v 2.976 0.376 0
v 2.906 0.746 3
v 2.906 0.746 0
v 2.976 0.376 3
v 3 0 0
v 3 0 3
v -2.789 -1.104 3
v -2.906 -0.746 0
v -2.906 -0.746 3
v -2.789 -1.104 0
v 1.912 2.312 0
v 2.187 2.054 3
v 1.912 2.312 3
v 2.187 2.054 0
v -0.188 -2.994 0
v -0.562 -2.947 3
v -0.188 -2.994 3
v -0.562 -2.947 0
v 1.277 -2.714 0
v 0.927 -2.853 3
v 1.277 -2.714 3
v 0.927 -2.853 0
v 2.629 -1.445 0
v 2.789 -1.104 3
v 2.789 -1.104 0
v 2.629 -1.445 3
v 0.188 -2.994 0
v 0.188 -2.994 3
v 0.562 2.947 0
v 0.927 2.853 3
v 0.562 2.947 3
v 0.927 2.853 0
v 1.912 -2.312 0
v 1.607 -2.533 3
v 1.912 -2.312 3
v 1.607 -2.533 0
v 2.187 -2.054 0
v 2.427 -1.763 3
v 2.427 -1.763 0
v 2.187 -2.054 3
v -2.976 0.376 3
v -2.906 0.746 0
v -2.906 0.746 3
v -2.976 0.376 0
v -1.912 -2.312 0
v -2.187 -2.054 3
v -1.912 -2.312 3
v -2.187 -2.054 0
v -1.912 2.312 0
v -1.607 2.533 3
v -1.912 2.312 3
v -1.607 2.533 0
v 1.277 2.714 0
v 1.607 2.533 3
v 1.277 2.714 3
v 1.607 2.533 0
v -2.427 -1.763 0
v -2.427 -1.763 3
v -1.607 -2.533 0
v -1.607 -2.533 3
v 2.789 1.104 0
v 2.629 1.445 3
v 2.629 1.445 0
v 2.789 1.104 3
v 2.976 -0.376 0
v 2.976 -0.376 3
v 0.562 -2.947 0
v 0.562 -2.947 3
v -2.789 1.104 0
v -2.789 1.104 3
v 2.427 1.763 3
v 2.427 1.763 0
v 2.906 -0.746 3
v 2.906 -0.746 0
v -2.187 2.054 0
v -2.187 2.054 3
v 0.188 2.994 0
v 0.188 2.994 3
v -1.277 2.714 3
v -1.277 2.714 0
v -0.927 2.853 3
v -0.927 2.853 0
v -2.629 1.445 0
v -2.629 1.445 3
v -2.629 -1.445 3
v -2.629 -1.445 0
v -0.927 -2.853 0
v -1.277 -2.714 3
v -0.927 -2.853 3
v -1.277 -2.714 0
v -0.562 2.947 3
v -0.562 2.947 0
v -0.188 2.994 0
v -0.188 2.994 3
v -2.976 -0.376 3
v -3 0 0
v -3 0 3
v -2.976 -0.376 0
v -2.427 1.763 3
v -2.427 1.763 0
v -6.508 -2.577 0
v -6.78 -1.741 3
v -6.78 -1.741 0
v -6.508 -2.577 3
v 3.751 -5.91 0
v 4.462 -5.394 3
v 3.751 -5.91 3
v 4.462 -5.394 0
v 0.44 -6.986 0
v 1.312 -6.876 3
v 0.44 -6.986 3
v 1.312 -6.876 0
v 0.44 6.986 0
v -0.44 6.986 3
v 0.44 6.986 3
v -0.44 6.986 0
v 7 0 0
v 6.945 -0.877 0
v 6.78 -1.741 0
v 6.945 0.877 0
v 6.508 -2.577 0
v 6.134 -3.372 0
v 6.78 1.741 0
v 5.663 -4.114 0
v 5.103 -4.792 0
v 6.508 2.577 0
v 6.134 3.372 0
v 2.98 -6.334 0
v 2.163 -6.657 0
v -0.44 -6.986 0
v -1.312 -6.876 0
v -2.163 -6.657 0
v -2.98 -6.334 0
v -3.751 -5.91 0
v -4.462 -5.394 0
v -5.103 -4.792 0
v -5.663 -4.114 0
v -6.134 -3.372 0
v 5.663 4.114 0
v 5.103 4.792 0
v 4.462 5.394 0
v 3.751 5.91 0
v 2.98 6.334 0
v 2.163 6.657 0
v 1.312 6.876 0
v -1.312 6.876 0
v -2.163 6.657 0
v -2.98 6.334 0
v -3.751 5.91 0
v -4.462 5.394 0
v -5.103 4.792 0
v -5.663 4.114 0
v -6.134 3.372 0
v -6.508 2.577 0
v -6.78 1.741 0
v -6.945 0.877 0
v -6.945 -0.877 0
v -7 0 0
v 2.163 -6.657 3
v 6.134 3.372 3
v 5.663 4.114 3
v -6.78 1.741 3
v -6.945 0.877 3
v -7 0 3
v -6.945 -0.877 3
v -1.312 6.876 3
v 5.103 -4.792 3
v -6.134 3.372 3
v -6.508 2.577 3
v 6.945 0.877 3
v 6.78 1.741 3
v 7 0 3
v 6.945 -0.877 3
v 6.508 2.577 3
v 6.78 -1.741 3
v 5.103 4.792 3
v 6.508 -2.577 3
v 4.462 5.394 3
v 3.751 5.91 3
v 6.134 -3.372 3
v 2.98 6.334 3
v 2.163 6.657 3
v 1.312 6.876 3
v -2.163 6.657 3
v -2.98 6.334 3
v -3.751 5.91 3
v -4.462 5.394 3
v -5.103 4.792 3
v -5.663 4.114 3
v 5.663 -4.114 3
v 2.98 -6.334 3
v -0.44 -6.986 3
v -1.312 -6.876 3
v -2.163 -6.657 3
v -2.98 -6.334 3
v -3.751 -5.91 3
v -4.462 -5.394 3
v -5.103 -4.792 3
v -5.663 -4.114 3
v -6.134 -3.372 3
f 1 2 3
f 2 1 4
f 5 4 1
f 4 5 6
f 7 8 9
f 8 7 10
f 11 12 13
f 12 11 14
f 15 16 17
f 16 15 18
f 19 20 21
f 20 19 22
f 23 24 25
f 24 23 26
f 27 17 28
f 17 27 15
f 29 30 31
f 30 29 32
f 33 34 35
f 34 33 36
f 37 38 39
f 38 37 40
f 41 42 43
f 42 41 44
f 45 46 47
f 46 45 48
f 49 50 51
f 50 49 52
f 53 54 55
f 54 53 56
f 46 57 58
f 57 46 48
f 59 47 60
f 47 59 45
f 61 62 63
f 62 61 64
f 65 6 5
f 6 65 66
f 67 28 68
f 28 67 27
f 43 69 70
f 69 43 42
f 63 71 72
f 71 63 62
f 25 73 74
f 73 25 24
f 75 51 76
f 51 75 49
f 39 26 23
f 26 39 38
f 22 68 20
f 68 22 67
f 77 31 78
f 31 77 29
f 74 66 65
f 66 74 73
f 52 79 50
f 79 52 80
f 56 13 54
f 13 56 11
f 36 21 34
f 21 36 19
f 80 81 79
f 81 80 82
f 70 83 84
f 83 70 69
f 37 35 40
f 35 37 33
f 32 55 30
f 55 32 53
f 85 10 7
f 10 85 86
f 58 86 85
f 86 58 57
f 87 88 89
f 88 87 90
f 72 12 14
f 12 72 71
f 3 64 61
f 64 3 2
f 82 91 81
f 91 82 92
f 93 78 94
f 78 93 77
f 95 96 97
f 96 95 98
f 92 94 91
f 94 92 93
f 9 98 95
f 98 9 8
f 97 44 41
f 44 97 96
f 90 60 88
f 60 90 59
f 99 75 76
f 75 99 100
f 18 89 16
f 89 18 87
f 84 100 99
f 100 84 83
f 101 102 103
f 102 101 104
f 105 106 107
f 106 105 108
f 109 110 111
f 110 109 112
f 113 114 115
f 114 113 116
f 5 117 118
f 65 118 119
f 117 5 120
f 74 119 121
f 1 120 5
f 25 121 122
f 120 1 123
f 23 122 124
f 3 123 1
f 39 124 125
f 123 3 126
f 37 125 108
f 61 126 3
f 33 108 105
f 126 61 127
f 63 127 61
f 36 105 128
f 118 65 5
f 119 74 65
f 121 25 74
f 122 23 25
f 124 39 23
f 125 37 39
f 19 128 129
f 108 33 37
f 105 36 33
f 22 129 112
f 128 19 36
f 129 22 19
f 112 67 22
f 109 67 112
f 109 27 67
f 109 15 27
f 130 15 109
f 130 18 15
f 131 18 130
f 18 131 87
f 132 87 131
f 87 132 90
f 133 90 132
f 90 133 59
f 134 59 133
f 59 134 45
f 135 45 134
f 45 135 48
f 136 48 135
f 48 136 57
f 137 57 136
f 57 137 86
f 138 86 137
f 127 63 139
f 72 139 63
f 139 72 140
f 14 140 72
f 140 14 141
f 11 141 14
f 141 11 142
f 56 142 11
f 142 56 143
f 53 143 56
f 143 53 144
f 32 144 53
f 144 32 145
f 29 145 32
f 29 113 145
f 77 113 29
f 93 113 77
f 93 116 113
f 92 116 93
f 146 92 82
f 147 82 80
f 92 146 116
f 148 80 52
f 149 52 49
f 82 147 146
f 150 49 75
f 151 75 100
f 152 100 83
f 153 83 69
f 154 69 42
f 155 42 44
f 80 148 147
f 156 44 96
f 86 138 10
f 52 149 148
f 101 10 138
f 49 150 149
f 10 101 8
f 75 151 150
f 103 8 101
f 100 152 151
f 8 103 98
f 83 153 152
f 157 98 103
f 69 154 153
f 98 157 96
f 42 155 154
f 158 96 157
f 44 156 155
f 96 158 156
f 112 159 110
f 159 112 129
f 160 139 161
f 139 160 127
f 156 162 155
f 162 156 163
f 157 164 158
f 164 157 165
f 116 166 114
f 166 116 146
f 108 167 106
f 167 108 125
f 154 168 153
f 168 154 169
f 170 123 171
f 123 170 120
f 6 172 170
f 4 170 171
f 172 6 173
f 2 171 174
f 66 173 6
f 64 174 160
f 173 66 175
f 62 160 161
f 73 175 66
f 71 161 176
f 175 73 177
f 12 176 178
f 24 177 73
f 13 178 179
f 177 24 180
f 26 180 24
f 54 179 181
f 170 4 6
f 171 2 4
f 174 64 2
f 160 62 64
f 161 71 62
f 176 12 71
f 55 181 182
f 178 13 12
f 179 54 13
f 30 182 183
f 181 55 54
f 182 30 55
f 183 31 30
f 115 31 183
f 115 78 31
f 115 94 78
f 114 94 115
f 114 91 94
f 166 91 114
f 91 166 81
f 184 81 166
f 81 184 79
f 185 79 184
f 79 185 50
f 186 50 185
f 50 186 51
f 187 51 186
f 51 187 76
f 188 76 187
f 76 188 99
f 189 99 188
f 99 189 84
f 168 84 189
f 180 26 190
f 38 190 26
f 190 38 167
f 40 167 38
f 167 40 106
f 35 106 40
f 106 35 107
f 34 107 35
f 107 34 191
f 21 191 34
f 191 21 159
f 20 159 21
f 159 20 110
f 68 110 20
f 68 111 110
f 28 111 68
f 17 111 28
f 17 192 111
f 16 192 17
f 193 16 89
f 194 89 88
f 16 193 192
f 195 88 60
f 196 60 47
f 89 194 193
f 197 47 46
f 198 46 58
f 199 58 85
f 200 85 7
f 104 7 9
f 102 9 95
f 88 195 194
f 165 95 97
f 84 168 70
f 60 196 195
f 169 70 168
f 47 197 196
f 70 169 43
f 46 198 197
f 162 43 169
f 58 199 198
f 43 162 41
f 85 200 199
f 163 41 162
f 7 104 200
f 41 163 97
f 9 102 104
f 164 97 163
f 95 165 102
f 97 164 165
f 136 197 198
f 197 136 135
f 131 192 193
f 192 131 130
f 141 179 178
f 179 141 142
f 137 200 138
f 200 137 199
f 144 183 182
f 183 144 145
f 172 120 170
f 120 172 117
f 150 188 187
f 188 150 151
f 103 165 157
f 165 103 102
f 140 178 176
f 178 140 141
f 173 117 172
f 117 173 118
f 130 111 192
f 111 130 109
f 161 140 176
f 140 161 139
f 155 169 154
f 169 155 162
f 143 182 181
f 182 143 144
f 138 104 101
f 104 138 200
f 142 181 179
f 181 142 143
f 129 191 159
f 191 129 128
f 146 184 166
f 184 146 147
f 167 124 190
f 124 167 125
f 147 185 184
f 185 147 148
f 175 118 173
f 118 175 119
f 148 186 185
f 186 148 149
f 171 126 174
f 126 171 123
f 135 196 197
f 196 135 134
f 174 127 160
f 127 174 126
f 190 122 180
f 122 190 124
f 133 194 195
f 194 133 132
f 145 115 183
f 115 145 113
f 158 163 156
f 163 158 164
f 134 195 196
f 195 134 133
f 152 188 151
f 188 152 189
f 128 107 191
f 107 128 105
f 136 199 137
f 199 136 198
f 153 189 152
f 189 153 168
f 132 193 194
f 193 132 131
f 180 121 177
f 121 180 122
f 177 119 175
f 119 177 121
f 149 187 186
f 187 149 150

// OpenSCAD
$fn = 50;


difference() {
	union() {
		*color(alpha = 1.0000000000, c = "gray") {
			translate(v = [0, 7, 0]) {
				linear_extrude(height = 1) {
					text(font = "Arial:style=Bold", halign = "center", size = 4.5000000000, text = "COMMENT plate main", valign = "center");
				}
			}
		}
		cylinder(h = 3, r = 7.0000000000);
	}
	union() {
		*color(alpha = 1.0000000000, c = "gray") {
			translate(v = [0, 7, 0]) {
				linear_extrude(height = 1) {
					text(font = "Arial:style=Bold", halign = "center", size = 4.5000000000, text = "COMMENT holes main", valign = "center");
				}
			}
		}
		translate(v = [0, 0, -100]) {
			cylinder(h = 200, r = 3.0000000000);
		}
		translate(v = [0, 0, -100]) {
			cylinder(h = 200, r = 1.5000000000);
		}
	}
}
